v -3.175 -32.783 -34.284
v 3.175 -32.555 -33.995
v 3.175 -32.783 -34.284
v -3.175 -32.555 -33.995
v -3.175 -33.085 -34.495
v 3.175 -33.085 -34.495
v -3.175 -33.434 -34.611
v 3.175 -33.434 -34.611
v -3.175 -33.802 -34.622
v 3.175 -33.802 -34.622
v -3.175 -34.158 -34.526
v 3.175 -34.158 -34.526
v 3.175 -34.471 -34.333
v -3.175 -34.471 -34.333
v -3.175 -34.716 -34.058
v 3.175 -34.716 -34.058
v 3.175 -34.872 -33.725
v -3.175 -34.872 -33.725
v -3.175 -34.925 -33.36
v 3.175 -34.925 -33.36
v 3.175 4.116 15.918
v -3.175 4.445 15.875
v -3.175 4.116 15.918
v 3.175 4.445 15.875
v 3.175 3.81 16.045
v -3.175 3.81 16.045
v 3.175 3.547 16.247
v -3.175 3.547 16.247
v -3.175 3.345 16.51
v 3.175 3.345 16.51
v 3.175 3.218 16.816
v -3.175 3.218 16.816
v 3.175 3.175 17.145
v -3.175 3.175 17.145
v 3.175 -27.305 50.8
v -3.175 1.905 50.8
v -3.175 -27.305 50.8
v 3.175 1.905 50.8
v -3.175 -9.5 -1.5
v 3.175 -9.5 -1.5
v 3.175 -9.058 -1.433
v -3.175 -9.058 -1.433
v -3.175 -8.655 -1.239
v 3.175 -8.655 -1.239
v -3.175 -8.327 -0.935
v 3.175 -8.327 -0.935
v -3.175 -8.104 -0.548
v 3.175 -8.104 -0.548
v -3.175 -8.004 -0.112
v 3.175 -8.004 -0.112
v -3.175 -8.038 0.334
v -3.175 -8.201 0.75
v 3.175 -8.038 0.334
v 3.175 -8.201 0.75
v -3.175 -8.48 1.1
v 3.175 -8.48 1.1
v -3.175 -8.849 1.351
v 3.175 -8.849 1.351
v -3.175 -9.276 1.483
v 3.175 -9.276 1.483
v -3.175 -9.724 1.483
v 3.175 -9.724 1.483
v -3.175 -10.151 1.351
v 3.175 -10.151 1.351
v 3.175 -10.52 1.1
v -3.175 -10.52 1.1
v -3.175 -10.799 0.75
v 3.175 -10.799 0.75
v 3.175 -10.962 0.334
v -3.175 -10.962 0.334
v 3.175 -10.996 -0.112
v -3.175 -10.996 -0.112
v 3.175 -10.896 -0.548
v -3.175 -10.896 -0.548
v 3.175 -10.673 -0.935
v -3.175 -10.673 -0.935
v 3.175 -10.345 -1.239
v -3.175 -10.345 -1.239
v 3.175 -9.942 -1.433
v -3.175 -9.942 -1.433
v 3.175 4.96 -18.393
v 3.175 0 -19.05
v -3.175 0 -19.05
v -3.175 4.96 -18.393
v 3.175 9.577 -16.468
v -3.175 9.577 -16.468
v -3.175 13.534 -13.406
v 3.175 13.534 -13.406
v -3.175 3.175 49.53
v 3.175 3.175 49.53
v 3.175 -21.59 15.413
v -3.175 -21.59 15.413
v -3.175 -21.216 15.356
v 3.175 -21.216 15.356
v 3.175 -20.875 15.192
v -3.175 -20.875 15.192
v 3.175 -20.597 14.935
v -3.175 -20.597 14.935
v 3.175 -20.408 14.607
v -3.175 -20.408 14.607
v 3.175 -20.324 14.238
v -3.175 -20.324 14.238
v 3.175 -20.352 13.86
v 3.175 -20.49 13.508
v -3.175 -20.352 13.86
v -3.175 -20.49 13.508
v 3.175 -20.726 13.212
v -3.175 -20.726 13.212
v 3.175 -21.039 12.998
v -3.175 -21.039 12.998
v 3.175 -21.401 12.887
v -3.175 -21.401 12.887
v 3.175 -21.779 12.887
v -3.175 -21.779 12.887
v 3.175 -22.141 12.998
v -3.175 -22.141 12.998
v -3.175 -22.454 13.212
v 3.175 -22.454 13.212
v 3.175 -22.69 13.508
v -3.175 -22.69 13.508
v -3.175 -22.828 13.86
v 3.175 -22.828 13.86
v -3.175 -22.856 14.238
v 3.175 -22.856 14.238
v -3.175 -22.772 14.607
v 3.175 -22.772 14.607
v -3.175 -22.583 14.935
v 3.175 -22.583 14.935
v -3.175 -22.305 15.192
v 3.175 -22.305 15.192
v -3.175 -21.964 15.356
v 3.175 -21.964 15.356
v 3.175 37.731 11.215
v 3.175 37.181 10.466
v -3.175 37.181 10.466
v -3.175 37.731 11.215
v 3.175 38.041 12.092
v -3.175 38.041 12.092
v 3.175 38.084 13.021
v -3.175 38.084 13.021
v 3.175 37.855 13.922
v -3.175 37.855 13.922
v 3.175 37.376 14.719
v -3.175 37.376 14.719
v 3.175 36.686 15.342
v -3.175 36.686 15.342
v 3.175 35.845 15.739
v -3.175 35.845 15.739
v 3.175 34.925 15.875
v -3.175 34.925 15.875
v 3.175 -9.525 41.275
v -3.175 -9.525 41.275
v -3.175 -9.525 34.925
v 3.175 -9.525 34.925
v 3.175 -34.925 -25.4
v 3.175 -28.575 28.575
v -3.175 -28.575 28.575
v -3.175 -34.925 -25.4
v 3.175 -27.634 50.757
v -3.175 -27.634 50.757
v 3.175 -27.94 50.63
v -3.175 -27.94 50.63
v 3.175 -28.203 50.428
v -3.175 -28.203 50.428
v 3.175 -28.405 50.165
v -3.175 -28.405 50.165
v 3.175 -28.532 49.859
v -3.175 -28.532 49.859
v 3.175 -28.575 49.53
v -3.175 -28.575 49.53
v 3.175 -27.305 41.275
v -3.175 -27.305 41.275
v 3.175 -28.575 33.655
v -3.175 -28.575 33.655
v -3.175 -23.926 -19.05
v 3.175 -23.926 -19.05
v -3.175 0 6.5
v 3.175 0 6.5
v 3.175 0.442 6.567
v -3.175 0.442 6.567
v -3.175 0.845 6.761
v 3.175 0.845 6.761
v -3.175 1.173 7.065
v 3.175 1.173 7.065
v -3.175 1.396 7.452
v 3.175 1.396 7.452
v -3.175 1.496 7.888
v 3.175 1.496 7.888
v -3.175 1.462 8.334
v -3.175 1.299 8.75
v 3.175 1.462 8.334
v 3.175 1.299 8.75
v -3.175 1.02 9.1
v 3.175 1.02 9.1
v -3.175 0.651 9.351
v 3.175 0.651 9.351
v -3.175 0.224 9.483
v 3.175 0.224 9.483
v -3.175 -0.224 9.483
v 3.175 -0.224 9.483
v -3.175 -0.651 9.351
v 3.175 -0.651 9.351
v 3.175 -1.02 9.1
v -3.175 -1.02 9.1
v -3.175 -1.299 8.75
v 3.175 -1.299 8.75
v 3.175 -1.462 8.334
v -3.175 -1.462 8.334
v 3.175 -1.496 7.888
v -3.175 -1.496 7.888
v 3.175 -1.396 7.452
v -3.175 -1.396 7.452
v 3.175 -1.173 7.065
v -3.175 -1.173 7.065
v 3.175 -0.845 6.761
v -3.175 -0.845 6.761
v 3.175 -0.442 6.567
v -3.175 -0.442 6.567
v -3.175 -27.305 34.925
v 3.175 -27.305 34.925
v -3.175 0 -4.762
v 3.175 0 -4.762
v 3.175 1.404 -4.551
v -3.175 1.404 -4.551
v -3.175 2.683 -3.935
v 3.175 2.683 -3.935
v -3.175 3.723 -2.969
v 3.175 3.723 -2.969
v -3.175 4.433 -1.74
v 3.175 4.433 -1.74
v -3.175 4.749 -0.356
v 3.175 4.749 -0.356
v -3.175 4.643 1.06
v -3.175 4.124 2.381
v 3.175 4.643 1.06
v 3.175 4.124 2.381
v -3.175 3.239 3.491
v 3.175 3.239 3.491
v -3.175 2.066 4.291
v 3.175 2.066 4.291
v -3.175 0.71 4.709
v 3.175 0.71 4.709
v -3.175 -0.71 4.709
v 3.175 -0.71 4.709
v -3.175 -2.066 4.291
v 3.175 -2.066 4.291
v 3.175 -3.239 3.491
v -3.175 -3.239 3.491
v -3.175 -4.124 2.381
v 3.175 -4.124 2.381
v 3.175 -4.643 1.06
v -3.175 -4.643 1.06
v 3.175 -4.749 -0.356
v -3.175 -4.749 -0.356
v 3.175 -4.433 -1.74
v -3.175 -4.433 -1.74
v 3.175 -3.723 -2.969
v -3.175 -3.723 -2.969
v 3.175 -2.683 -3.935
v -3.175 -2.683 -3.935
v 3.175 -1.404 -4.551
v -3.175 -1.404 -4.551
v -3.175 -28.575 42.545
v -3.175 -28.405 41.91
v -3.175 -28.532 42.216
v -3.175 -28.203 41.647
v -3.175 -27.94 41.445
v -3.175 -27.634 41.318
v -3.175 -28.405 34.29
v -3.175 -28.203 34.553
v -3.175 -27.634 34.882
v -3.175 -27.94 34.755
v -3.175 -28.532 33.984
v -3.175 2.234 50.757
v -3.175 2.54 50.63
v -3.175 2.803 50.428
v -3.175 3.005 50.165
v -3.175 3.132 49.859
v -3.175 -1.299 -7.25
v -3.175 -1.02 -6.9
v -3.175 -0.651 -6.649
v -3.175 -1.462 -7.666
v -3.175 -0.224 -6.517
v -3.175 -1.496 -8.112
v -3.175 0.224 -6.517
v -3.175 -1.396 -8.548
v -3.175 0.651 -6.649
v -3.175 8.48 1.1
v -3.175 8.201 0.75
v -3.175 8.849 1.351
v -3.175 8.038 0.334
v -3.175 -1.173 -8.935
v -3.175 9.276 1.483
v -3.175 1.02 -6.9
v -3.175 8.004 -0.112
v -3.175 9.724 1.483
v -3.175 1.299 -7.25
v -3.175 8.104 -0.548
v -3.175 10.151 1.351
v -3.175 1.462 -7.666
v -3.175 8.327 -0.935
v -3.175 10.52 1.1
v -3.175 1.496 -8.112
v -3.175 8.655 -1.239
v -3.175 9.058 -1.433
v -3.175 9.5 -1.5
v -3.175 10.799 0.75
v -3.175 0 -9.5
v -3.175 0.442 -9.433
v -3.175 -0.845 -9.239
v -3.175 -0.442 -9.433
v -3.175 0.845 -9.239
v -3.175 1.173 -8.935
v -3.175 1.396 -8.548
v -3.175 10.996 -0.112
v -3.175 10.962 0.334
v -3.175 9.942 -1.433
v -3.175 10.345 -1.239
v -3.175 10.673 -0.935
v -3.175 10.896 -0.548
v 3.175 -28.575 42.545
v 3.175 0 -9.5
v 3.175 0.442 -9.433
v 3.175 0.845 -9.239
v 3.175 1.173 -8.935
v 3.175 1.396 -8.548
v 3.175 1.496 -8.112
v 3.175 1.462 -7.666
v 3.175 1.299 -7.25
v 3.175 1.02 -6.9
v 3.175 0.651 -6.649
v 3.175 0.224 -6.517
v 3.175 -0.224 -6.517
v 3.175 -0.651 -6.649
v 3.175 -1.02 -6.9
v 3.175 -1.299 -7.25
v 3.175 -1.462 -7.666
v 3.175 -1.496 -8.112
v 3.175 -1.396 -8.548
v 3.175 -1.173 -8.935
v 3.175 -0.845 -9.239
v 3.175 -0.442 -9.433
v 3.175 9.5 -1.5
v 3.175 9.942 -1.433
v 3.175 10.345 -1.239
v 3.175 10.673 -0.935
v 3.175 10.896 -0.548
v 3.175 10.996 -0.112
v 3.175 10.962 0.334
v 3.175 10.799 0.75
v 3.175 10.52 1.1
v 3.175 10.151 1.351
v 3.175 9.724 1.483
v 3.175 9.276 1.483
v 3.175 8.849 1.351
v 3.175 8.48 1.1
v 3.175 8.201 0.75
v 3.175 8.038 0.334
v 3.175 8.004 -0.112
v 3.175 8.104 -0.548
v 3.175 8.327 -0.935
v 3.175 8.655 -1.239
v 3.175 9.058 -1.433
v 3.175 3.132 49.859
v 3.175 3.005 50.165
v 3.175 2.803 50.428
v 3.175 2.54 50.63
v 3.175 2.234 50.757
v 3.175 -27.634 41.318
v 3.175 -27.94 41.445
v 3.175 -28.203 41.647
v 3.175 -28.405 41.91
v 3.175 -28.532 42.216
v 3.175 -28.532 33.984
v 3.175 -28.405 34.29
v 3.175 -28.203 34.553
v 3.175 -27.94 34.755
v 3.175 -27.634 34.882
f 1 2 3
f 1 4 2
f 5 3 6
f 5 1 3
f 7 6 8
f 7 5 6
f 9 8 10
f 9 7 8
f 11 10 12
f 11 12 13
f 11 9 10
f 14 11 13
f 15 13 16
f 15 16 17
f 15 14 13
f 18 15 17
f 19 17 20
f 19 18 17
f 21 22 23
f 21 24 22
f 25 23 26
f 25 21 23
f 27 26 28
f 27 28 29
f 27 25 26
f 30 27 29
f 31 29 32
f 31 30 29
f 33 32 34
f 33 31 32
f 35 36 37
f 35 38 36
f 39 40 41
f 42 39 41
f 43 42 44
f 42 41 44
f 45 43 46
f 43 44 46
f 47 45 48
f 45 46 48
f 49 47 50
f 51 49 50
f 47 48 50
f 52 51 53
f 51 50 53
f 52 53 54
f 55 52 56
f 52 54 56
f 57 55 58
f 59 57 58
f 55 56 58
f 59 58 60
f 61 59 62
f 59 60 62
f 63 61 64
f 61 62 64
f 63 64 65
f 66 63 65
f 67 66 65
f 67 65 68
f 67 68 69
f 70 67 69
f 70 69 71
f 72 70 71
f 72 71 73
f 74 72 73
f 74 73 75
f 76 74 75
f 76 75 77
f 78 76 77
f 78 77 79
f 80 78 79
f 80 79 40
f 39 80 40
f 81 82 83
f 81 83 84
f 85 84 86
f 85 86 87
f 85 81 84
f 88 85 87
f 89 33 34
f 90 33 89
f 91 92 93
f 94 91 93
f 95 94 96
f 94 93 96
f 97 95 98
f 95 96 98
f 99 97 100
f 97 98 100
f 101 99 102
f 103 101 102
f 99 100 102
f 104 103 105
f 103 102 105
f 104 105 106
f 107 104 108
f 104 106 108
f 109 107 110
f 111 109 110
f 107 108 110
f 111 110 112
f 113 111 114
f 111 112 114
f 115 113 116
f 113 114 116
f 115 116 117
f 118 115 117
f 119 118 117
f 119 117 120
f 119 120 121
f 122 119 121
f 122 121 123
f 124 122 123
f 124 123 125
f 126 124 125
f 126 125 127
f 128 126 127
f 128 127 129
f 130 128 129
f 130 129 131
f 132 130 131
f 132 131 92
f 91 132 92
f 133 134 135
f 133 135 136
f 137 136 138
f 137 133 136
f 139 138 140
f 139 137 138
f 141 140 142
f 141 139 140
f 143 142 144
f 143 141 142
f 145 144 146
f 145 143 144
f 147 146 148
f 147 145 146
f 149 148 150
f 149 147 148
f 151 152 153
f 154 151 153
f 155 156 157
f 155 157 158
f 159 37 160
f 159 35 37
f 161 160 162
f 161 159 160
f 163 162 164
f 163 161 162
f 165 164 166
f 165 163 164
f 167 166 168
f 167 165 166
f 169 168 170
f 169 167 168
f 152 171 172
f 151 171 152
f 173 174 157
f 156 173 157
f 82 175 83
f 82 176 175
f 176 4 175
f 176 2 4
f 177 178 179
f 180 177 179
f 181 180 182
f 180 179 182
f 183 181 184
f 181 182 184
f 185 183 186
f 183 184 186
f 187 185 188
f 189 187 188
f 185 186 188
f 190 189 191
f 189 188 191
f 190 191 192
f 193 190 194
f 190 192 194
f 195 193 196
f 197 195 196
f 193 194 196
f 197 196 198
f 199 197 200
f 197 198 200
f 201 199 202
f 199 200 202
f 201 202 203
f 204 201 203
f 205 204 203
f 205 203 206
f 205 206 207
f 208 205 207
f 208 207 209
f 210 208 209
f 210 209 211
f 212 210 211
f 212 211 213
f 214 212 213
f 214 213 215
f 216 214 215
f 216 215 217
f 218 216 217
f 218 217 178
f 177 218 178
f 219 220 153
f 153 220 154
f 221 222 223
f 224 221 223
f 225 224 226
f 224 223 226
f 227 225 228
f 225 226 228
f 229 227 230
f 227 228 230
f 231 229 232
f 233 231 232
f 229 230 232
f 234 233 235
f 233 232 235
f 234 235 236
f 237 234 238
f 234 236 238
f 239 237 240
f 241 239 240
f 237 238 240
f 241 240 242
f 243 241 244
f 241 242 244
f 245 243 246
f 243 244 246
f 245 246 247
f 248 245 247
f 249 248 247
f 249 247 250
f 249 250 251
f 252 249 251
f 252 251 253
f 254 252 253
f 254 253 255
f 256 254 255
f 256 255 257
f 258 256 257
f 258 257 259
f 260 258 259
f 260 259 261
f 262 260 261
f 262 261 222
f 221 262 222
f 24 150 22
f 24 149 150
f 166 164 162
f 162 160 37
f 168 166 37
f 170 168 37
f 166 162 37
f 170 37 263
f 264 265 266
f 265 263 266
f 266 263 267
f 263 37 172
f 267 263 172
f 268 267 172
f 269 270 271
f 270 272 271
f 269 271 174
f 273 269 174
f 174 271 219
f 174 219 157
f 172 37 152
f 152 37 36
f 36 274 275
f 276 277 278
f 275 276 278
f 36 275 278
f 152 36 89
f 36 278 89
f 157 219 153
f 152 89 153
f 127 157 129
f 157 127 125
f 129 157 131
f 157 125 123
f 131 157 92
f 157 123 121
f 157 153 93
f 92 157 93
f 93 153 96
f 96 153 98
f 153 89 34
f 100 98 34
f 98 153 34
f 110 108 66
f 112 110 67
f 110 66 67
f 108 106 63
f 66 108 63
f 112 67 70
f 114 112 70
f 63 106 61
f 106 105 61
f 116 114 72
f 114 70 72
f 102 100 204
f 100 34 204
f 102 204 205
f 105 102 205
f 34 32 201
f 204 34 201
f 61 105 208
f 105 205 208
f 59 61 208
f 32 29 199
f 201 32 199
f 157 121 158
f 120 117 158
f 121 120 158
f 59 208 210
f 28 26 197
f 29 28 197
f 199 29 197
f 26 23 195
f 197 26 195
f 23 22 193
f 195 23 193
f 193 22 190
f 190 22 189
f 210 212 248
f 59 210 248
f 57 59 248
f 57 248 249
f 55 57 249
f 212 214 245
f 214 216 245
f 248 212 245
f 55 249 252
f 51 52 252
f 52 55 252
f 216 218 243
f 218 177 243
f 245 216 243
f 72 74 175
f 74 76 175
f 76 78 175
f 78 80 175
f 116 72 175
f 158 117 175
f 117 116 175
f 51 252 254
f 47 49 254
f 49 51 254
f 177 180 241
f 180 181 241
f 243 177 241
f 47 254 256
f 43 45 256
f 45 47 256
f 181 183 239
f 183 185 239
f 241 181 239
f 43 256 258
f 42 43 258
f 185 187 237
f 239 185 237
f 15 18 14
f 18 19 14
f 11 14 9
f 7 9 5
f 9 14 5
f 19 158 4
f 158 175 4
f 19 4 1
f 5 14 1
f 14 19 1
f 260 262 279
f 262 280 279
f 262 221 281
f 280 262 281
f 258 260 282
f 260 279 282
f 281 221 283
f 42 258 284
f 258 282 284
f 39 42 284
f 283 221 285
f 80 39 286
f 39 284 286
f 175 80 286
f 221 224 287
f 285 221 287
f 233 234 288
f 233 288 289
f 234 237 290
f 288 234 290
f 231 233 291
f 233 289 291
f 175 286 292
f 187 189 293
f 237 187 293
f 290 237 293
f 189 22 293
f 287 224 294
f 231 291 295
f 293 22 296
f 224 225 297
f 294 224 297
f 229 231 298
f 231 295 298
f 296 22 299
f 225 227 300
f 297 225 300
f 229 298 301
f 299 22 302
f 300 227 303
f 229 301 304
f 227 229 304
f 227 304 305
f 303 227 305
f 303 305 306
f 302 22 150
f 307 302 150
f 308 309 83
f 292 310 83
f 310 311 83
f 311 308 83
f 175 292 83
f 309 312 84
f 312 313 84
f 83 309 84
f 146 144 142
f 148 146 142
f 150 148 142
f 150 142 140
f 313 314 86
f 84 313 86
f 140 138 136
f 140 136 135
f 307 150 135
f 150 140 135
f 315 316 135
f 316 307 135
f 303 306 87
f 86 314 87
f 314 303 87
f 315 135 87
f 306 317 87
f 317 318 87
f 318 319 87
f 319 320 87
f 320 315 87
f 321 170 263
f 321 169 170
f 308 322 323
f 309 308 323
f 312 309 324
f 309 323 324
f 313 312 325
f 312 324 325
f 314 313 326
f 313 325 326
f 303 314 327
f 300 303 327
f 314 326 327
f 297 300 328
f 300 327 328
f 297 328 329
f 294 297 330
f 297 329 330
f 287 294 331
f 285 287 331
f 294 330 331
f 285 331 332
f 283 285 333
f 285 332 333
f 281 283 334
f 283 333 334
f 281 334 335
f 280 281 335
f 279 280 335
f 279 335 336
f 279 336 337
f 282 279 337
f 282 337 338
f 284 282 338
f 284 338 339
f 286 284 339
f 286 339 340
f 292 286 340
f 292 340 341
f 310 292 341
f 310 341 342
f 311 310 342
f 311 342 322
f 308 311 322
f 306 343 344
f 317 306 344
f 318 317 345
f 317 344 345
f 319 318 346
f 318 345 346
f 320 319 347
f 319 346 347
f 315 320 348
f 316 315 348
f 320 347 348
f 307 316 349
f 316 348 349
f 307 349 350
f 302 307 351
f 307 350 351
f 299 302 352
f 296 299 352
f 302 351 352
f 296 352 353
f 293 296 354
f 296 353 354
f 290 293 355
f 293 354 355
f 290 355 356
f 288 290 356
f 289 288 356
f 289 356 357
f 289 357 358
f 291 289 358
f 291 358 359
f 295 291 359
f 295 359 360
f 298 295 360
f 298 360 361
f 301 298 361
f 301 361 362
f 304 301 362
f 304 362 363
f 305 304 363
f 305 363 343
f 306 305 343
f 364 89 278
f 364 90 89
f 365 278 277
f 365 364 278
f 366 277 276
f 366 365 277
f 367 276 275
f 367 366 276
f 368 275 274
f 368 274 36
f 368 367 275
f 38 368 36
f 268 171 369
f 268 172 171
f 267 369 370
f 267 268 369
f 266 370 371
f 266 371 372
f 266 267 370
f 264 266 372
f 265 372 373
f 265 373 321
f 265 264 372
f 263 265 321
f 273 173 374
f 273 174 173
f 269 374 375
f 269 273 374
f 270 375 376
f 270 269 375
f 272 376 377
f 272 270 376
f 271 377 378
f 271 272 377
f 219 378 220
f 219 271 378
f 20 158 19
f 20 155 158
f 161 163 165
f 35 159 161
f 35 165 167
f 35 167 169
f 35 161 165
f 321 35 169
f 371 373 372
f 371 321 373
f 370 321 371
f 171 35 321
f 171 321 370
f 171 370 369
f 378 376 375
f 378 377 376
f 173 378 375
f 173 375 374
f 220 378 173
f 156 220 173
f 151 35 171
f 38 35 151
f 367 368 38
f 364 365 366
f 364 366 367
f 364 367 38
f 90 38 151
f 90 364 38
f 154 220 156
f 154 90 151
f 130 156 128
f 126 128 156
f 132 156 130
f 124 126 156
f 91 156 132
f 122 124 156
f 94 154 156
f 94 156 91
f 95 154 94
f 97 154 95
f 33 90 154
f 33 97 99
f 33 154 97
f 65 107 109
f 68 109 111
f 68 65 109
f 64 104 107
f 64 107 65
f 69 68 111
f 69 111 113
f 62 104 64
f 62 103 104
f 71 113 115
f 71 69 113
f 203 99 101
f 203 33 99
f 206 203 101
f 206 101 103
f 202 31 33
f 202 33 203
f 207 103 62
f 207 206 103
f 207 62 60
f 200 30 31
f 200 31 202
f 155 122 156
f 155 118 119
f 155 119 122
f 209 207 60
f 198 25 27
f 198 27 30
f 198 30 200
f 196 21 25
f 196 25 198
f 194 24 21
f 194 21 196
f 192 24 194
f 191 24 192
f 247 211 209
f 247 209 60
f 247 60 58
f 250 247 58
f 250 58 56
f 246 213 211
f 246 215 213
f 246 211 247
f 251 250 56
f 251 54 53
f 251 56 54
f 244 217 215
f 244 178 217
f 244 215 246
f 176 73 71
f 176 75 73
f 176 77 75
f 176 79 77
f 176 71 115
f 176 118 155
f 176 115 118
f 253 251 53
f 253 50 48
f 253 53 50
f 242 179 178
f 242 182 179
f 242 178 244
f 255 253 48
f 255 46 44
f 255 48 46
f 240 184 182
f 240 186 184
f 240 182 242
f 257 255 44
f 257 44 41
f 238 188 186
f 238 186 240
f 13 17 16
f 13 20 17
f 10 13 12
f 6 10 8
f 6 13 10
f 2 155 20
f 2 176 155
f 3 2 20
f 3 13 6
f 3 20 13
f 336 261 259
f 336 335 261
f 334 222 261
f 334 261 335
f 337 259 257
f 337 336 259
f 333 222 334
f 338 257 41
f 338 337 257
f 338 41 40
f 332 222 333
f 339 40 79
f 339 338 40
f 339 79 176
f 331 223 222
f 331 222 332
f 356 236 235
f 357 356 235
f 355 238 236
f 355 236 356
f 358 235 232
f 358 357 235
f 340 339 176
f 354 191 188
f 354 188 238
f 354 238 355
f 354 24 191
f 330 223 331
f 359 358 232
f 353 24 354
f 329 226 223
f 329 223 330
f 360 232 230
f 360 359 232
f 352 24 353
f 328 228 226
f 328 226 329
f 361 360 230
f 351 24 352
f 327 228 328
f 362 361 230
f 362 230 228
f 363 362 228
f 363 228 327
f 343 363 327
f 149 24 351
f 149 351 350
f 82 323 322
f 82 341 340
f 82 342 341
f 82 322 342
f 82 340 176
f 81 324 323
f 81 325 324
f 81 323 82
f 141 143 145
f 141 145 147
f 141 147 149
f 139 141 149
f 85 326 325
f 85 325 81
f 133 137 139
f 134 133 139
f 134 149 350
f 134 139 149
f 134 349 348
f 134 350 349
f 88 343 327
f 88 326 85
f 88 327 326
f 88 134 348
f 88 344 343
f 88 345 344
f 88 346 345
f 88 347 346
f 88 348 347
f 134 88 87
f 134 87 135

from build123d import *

# Parameters (mm, degrees)
BOSS_EXTRUDE1_DEPTH     = 3.175
SKETCH15_W              = 6.35
SKETCH15_H              = 19.05
CUT_EXTRUDE4_DEPTH      = 4.175
CUT_EXTRUDE4_DEPTH_BACK = 4.175
SKETCH37_R              = 1.5
SKETCH37_R_2            = 4.7625
CUT_EXTRUDE15_DEPTH     = 7.35
SKETCH47_R              = 1.27
CUT_EXTRUDE18_DEPTH     = 7.35
FILLET14_R              = 1.27
FILLET15_R              = 1.27


with BuildPart() as part:
    # Sketch5 → Boss-Extrude1 (new body, symmetric)
    with BuildSketch(Plane(origin=(0, 0, 0), x_dir=(0, 0, -1), z_dir=(1, 0, 0))):
        with BuildLine():
            Line((19.05, -23.926477372), (19.05, 0))
            ThreePointArc((19.05, 0), (17.582566657, 7.331838088), (13.406341233, 13.534124085))
            Line((13.406341233, 13.534124085), (-10.465609794, 37.180687347))
            ThreePointArc((-10.465609794, 37.180687347), (-13.921973015, 37.855427776), (-15.875, 34.925))
            Line((-15.875, 34.925), (-15.875, 3.175))
            Line((-15.875, 3.175), (-50.8, 3.175))
            Line((-50.8, 3.175), (-50.8, -28.575))
            Line((-50.8, -28.575), (-28.575, -28.575))
            Line((-28.575, -28.575), (25.4, -34.925))
            Line((25.4, -34.925), (38.1, -34.925))
            Line((38.1, -34.925), (19.05, -23.926477372))
        make_face()
    extrude(amount=BOSS_EXTRUDE1_DEPTH, both=True)

    # Sketch15 → Cut-Extrude4 (cut, two sides)
    with BuildSketch(Plane(origin=(0, 0, 0), x_dir=(0, 0, -1), z_dir=(1, 0, 0))) as cut_extrude4_sk:
        with Locations((-38.1, -19.05)):
            Rectangle(SKETCH15_W, SKETCH15_H)
    extrude(amount=CUT_EXTRUDE4_DEPTH, mode=Mode.SUBTRACT)
    extrude(cut_extrude4_sk.sketch, amount=-CUT_EXTRUDE4_DEPTH_BACK, mode=Mode.SUBTRACT)

    # Sketch37 → Cut-Extrude15 (cut, through all)
    with BuildSketch(Plane(origin=(3.175, 0, 0), x_dir=(0, 0, -1), z_dir=(1, 0, 0))):
        with Locations((0, -9.5)):
            Circle(SKETCH37_R)
        with Locations((0, 9.5)):
            Circle(SKETCH37_R)
        with Locations((8, 0)):
            Circle(SKETCH37_R)
        with Locations((-8, 0)):
            Circle(SKETCH37_R)
        Circle(SKETCH37_R_2)
    extrude(amount=-CUT_EXTRUDE15_DEPTH, mode=Mode.SUBTRACT)

    # Sketch47 → Cut-Extrude18 (cut, through all)
    with BuildSketch(Plane.ZY.offset(3.175)):
        with Locations((14.14272, -21.59)):
            Circle(SKETCH47_R)
    extrude(amount=-CUT_EXTRUDE18_DEPTH, mode=Mode.SUBTRACT)

    # Fillet14
    fillet14_edges = [part.edges().sort_by_distance(p)[0] for p in [
        (0, -34.925, -38.1),
    ]]
    fillet(fillet14_edges, radius=FILLET14_R)

    # Fillet15
    fillet15_edges = [part.edges().sort_by_distance(p)[0] for p in [
        (0, -28.575, 50.8),
        (0, 3.175, 50.8),
        (0, 3.175, 15.875),
        (0, -28.575, 34.925),
        (0, -28.575, 41.275),
    ]]
    fillet(fillet15_edges, radius=FILLET15_R)


solid = part.part
